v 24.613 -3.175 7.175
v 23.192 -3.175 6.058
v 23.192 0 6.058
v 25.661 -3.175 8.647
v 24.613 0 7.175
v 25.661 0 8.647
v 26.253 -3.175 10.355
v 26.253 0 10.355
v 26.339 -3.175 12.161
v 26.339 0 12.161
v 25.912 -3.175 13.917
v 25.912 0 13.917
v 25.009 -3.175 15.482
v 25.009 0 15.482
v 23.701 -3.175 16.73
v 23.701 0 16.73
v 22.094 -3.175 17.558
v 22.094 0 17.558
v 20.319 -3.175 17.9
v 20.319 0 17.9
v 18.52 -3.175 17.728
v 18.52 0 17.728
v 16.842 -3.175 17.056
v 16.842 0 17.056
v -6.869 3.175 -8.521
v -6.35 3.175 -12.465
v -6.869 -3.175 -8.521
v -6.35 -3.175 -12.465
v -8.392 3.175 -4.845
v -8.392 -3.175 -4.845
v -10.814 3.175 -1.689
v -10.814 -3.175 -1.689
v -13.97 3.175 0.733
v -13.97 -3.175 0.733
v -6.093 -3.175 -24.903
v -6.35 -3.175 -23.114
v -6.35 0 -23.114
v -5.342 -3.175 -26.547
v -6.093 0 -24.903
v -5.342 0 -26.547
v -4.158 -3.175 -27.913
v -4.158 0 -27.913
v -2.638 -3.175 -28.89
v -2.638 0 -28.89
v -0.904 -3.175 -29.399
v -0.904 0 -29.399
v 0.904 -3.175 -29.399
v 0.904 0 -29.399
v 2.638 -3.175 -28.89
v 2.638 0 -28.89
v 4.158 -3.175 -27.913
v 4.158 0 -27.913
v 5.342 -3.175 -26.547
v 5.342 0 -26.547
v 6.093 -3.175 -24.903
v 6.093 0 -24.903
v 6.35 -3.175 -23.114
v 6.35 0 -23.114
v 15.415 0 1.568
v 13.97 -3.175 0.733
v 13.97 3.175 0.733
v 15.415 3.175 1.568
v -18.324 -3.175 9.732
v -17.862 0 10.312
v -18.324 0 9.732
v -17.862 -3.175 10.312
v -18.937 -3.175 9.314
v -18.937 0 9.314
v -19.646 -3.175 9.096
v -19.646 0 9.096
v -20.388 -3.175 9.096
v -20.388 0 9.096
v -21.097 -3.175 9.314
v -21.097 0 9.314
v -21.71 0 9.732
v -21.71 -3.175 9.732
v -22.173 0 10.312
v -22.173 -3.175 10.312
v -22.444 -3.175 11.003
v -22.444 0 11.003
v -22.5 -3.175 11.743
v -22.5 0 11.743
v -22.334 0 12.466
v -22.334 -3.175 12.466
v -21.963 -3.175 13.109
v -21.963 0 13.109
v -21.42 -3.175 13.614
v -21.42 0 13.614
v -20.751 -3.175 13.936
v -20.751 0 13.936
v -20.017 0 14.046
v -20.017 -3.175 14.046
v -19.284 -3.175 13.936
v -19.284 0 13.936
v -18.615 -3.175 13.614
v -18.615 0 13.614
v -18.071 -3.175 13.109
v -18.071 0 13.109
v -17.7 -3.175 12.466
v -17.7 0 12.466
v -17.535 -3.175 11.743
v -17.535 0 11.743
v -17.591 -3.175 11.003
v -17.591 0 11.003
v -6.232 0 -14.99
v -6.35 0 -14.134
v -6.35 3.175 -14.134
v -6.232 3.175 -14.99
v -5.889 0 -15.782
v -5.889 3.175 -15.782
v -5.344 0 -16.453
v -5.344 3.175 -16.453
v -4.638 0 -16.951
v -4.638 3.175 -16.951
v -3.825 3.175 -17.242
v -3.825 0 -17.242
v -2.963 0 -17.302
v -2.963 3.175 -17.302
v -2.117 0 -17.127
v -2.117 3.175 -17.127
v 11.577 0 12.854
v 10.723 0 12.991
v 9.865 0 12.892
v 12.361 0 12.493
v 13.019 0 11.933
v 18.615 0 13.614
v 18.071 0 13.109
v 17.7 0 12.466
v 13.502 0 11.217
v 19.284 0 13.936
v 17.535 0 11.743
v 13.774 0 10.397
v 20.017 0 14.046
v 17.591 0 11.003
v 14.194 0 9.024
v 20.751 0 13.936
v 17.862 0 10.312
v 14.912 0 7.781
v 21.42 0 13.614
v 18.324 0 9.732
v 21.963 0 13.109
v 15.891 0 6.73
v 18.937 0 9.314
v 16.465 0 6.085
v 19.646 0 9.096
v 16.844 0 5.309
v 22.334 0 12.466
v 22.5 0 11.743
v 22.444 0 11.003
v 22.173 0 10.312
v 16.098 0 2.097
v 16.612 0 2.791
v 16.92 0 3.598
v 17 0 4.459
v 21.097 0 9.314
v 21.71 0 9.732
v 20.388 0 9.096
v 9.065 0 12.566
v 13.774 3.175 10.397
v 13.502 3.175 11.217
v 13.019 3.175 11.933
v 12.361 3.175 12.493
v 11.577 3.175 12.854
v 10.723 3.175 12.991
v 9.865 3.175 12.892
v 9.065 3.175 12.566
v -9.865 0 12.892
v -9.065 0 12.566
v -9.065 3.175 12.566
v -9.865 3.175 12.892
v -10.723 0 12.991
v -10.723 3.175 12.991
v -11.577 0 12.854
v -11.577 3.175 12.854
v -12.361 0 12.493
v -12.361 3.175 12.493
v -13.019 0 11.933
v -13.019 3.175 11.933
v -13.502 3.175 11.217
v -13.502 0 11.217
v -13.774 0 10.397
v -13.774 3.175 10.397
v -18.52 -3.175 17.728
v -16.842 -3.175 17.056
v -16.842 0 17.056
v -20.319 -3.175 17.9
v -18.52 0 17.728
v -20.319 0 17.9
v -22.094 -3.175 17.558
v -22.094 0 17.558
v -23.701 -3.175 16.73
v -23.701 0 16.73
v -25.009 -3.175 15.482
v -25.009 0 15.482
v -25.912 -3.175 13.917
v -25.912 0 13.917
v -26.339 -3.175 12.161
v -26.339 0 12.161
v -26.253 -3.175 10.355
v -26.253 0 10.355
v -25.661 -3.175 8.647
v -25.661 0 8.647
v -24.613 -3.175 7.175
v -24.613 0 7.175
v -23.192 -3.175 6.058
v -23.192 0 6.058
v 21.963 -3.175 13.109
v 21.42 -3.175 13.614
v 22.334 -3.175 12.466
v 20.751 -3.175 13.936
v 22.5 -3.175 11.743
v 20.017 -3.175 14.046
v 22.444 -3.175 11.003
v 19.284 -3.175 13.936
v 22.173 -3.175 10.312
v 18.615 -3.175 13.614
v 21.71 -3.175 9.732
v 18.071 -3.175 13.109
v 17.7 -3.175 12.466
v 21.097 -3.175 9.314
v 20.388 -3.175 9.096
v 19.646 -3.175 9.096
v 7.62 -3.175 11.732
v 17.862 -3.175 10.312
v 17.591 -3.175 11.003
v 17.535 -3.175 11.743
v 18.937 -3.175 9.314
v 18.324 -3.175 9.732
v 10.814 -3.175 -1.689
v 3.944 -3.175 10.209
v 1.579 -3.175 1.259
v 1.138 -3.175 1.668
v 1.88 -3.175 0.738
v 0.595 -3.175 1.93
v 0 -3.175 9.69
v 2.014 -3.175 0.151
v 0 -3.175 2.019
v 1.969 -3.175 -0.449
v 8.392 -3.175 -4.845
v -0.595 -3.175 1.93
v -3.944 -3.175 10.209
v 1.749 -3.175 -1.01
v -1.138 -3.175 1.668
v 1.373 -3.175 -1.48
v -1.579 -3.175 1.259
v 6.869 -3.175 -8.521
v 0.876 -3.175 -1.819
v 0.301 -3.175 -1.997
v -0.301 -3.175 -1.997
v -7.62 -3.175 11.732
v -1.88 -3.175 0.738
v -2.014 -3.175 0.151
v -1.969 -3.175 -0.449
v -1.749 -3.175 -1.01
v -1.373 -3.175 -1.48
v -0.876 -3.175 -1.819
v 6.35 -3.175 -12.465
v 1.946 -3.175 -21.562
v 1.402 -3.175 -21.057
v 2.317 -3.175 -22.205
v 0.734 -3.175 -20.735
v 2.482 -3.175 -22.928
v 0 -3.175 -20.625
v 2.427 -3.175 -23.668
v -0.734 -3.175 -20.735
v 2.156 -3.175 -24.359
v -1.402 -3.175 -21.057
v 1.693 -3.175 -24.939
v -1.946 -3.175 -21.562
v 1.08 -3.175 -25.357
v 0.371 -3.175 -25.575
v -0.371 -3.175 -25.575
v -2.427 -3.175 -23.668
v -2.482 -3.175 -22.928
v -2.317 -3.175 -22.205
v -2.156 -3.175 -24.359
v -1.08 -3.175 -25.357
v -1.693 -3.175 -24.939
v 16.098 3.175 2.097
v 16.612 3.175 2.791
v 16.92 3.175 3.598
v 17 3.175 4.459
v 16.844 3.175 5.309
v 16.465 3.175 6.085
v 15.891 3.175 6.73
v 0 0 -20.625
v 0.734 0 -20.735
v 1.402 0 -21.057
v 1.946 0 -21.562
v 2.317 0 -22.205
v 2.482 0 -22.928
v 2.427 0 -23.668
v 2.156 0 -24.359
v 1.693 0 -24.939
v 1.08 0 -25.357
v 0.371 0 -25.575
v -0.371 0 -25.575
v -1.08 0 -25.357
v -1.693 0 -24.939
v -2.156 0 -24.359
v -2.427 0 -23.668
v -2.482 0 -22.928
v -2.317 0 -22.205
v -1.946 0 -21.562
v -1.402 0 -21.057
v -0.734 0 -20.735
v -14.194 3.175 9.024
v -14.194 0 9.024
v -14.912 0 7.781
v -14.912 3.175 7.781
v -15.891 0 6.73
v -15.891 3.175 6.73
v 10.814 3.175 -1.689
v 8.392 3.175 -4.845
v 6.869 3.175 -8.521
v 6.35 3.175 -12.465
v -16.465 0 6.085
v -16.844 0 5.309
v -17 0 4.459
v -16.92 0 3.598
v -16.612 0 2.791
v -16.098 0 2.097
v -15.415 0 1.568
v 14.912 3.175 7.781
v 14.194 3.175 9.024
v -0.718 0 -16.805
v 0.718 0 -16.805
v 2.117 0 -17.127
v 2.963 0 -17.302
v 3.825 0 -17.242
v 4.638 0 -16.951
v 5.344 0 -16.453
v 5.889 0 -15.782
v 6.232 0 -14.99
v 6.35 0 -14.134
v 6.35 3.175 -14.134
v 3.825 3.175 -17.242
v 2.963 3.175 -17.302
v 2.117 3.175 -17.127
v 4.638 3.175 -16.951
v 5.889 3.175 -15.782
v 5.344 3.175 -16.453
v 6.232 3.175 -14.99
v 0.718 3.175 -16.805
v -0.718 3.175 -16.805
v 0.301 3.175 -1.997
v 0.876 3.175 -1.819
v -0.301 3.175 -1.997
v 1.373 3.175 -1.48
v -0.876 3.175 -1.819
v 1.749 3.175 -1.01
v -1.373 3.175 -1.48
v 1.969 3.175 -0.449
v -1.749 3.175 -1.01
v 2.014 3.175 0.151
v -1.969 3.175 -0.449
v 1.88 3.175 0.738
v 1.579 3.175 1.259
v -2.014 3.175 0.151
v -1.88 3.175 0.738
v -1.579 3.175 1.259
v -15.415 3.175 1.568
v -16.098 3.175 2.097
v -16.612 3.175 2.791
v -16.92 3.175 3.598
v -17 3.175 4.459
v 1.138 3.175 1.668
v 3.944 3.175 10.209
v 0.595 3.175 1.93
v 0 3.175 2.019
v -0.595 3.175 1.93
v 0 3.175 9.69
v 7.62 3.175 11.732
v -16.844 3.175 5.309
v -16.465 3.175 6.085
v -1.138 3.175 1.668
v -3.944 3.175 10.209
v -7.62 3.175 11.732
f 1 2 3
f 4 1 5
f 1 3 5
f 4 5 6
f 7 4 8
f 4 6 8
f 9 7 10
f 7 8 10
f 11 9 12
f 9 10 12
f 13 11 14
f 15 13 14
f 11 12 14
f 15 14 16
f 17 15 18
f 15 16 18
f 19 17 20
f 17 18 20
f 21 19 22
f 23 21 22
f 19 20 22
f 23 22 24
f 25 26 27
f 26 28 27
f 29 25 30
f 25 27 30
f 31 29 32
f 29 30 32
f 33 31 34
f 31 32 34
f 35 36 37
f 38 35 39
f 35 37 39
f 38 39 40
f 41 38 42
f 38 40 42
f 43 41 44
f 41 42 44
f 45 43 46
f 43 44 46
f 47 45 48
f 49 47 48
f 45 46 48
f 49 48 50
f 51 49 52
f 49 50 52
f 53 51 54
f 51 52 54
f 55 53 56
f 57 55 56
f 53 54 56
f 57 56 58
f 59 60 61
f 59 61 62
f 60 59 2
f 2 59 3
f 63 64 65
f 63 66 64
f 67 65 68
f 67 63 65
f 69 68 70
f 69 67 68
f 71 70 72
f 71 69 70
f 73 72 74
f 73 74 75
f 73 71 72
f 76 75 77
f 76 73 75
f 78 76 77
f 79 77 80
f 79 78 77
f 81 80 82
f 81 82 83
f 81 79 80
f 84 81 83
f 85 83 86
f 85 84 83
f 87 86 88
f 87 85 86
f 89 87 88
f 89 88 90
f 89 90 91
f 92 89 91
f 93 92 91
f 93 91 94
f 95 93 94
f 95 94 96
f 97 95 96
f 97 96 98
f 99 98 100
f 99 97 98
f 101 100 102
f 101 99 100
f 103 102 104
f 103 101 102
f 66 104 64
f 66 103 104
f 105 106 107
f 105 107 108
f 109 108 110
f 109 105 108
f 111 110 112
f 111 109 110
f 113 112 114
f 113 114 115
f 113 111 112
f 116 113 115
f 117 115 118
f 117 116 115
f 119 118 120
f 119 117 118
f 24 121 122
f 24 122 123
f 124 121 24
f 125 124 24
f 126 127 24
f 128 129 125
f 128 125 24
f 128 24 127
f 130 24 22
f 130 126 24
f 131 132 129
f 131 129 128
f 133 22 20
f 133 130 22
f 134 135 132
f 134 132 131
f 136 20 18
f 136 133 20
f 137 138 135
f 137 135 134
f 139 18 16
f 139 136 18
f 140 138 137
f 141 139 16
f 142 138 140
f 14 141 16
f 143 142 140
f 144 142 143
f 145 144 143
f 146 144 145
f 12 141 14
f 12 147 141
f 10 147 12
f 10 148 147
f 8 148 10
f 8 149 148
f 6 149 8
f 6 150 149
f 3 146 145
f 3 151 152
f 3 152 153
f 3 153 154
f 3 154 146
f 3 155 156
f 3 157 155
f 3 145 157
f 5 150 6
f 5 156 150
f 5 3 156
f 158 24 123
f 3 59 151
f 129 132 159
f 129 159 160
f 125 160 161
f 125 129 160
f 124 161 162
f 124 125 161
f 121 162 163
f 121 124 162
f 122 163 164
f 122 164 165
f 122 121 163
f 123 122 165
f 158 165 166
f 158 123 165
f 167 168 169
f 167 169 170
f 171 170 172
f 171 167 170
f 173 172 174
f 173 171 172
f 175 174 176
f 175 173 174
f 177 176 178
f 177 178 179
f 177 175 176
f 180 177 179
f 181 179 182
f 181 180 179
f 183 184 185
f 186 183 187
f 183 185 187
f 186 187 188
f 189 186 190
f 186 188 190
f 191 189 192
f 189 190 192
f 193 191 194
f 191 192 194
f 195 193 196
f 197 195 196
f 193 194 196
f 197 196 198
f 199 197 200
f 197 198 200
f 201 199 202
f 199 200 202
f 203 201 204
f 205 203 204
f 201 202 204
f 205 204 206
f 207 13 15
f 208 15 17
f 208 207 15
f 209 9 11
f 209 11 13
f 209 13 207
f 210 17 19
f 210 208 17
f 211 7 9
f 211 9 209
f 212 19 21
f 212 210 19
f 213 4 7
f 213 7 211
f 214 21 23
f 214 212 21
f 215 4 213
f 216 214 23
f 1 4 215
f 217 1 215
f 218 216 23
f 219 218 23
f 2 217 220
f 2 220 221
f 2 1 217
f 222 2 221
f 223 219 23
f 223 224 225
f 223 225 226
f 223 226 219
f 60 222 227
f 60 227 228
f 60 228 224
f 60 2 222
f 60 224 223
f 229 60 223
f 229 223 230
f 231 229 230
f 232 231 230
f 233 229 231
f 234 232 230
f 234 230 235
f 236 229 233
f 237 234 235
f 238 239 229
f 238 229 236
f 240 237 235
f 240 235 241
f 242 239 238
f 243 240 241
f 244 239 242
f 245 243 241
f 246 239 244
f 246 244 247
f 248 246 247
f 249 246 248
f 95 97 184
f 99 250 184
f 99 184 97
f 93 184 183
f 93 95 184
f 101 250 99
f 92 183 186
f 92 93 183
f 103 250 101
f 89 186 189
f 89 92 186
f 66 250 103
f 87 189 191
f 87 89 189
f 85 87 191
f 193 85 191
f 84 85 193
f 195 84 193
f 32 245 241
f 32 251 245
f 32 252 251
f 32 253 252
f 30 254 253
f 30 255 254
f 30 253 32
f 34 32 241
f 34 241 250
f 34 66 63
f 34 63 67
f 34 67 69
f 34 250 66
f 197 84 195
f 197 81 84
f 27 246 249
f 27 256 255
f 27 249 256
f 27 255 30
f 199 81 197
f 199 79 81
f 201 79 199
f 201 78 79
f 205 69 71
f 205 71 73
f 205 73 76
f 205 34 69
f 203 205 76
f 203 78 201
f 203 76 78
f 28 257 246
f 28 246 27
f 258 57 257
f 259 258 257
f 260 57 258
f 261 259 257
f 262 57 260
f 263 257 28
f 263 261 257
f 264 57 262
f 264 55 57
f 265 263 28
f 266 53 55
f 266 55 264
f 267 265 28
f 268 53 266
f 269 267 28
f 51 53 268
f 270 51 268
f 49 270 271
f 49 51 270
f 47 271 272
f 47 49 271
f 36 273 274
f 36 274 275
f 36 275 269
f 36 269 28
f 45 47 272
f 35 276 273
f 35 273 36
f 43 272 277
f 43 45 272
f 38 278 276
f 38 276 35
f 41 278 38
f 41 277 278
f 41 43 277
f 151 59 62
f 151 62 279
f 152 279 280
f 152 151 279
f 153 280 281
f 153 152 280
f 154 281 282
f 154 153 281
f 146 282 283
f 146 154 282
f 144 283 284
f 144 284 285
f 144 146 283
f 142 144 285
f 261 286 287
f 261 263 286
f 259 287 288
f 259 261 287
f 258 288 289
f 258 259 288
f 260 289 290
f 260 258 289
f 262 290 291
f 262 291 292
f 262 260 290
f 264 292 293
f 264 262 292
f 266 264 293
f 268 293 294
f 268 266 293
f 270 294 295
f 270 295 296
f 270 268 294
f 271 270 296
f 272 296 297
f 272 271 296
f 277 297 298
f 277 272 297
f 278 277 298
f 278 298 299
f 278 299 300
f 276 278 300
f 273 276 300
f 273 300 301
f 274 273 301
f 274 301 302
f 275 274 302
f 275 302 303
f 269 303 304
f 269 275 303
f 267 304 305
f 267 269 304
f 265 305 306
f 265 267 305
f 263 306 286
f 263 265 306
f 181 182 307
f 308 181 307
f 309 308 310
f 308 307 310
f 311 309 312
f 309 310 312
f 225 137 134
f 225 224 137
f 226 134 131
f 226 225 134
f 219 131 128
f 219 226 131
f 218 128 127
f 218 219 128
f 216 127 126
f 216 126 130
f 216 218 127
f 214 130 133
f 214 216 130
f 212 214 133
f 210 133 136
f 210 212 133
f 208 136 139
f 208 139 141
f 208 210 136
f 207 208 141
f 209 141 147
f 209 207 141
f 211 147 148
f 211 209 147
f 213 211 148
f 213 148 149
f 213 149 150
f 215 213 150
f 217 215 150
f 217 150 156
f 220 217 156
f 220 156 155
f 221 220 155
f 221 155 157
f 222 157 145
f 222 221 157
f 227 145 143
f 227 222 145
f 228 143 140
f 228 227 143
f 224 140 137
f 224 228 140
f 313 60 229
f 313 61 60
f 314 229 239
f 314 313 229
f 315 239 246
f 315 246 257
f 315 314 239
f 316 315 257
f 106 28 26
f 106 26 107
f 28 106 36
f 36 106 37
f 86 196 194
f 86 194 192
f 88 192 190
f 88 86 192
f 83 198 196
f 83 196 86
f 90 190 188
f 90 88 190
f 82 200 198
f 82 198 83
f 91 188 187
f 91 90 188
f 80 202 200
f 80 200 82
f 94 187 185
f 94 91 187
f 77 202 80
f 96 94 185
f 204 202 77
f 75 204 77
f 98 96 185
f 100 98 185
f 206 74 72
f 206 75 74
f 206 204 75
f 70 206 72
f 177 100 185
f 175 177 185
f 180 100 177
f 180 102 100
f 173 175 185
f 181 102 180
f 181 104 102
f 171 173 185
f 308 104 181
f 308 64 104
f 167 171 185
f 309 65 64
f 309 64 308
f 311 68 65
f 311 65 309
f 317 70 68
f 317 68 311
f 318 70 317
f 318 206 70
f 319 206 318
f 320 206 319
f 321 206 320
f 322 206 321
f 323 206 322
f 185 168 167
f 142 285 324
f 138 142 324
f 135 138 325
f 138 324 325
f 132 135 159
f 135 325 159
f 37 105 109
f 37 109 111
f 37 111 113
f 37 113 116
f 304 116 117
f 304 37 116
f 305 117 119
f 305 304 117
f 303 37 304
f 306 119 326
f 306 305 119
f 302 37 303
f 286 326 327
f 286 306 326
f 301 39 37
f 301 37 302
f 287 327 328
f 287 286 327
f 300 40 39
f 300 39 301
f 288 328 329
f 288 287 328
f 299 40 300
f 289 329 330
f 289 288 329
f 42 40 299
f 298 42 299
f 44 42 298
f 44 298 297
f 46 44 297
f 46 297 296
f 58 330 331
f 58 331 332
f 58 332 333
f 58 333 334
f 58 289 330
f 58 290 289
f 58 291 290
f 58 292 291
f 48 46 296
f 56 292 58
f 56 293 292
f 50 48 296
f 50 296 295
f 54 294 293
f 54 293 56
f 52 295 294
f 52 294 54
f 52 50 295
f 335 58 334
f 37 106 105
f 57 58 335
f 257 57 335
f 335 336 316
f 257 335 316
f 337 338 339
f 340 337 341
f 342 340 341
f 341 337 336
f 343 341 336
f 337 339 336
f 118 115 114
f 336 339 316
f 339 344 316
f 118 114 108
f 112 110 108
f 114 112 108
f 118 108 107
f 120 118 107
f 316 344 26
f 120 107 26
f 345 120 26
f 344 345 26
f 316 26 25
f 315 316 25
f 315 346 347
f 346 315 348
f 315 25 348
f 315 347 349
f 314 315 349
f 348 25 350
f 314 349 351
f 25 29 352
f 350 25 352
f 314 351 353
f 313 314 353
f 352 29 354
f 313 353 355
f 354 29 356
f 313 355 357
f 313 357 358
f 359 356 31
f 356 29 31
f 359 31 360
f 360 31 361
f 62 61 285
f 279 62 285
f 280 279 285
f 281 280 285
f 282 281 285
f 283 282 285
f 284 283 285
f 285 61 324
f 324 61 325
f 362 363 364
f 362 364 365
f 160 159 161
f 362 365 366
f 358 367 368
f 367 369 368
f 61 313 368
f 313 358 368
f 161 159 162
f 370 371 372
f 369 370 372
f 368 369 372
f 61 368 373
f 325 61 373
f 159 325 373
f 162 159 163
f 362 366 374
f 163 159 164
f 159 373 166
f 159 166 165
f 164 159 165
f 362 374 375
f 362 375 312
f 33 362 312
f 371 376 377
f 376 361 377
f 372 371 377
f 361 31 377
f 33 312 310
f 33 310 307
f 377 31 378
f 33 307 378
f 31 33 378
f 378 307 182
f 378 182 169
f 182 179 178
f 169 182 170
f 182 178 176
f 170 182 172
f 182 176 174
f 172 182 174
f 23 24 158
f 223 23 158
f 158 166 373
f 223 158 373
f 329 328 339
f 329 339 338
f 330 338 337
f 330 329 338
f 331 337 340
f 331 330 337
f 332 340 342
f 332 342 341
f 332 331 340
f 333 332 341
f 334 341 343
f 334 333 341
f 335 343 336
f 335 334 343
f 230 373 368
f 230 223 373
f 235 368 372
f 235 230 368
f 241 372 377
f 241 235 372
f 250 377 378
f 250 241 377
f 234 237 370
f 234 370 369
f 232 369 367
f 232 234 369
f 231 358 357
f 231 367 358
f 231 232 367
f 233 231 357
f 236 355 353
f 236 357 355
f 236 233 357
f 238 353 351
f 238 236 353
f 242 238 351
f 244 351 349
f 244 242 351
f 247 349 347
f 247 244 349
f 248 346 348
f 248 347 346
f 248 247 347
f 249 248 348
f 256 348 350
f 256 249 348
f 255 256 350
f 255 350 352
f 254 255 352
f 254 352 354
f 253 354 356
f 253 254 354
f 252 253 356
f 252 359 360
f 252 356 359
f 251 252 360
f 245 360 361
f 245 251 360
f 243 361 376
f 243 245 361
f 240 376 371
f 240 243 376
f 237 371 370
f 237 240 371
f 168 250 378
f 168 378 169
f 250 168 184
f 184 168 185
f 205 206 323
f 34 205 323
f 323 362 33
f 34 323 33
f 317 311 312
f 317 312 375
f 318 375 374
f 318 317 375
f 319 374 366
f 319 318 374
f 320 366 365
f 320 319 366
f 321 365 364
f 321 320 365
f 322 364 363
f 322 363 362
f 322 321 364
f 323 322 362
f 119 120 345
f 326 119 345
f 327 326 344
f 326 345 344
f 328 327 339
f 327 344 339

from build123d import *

# Parameters (mm, degrees)
SKETCH1_R           = 2.0193
SKETCH1_R_2         = 2.4892
BOSS_EXTRUDE1_DEPTH = 3.175
SKETCH3_R           = 6.35
SKETCH3_R_2         = 2.4892
CUT_EXTRUDE1_DEPTH  = 3.175
CIRPATTERN1_COUNT   = 3
FILLET3_R           = 15.24
FILLET2_DEPTH       = 3.175


with BuildPart() as part:
    # Sketch1 → Boss-Extrude1 (new, symmetric)
    with BuildSketch(Plane(origin=(0, 0, 0), x_dir=(1, 0, 0), z_dir=(0, 1, 0))):
        with BuildLine():
            Line((-6.35, 0), (-6.35, 23.114))
            ThreePointArc((-6.35, 23.114), (0, 29.464), (6.35, 23.114))
            Line((6.35, 23.114), (6.35, 0))
            ThreePointArc((6.35, 0), (0, -6.35), (-6.35, 0))
        make_face()
        with Locations(Location((0, 0, 0), (0, 0, 270))):
            Circle(SKETCH1_R, mode=Mode.SUBTRACT)
        with Locations(Location((0, 23.114, 0), (0, 0, 270))):
            Circle(SKETCH1_R_2, mode=Mode.SUBTRACT)
    boss_extrude1 = extrude(amount=BOSS_EXTRUDE1_DEPTH, both=True)

    # Sketch3 → Cut-Extrude1 (cut)
    with BuildSketch(Plane(origin=(0, 3.175, 0), x_dir=(1, 0, 0), z_dir=(0, 1, 0))):
        with Locations((0, 23.114)):
            Circle(SKETCH3_R)
        with Locations(Location((0, 23.114, 0), (0, 0, 270))):
            Circle(SKETCH3_R_2, mode=Mode.SUBTRACT)
    cut_extrude1 = extrude(amount=-CUT_EXTRUDE1_DEPTH, mode=Mode.SUBTRACT)

    # CirPattern1: Boss-Extrude1, Cut-Extrude1 ×3 about axis
    cirpattern1_axis = Axis((0, 0, 0), (0, 1, 0))
    add([boss_extrude1.rotate(cirpattern1_axis, i * 360 / CIRPATTERN1_COUNT) for i in range(1, CIRPATTERN1_COUNT)])
    add([cut_extrude1.rotate(cirpattern1_axis, i * 360 / CIRPATTERN1_COUNT) for i in range(1, CIRPATTERN1_COUNT)], mode=Mode.SUBTRACT)

    # Fillet3
    fillet3_edges = [part.edges().sort_by_distance(p)[0] for p in [
        (-6.35, 0, -3.666174209),
        (6.35, 0, -3.666174209),
        (0, 0, 7.332348419),
    ]]
    fillet(fillet3_edges, radius=FILLET3_R)

    # Fillet2: read off the stored shape, not the designer's step
    # Fillet2 outline → Fillet2 (cut)
    with BuildSketch(Plane(origin=(0, 0, 0), x_dir=(1, 0, 0), z_dir=(0, 1, 0))):
        with BuildLine():
            ThreePointArc((15.41518125, -1.567610625), (16.989288832, -4.025929604), (15.890891228, -6.730494188))
            ThreePointArc((15.890891228, -6.730494188), (19.434687828, -5.233784835), (23.192311183, -6.057738686))
            Line((23.192311183, -6.057738686), (15.41518125, -1.567610625))
        make_face()
        with BuildLine():
            ThreePointArc((16.842311183, -17.056261314), (14.249934539, -14.214040956), (13.774224561, -10.396668398))
            ThreePointArc((13.774224561, -10.396668398), (11.981201728, -12.700190919), (9.06518125, -12.566133253))
            Line((9.06518125, -12.566133253), (16.842311183, -17.056261314))
        make_face()
        with BuildLine():
            ThreePointArc((-9.06518125, -12.566133253), (-11.981201728, -12.700190919), (-13.774224561, -10.396668398))
            ThreePointArc((-13.774224561, -10.396668398), (-14.249934539, -14.214040956), (-16.842311183, -17.056261314))
            Line((-16.842311183, -17.056261314), (-9.06518125, -12.566133253))
        make_face()
        with BuildLine():
            ThreePointArc((-23.192311183, -6.057738686), (-19.434687828, -5.233784835), (-15.890891228, -6.730494188))
            ThreePointArc((-15.890891228, -6.730494188), (-16.989288832, -4.025929604), (-15.41518125, -1.567610625))
            Line((-15.41518125, -1.567610625), (-23.192311183, -6.057738686))
        make_face()
        with BuildLine():
            ThreePointArc((-6.35, 14.133743879), (-5.008087105, 16.726120523), (-2.116666667, 17.127162586))
            ThreePointArc((-2.116666667, 17.127162586), (-5.184753289, 19.447825791), (-6.35, 23.114))
            Line((-6.35, 23.114), (-6.35, 14.133743879))
        make_face()
        with BuildLine():
            ThreePointArc((2.116666667, 17.127162586), (5.008087105, 16.726120523), (6.35, 14.133743879))
            Line((6.35, 14.133743879), (6.35, 23.114))
            ThreePointArc((6.35, 23.114), (5.184753289, 19.447825791), (2.116666667, 17.127162586))
        make_face()
    extrude(amount=FILLET2_DEPTH, mode=Mode.SUBTRACT)


solid = part.part
